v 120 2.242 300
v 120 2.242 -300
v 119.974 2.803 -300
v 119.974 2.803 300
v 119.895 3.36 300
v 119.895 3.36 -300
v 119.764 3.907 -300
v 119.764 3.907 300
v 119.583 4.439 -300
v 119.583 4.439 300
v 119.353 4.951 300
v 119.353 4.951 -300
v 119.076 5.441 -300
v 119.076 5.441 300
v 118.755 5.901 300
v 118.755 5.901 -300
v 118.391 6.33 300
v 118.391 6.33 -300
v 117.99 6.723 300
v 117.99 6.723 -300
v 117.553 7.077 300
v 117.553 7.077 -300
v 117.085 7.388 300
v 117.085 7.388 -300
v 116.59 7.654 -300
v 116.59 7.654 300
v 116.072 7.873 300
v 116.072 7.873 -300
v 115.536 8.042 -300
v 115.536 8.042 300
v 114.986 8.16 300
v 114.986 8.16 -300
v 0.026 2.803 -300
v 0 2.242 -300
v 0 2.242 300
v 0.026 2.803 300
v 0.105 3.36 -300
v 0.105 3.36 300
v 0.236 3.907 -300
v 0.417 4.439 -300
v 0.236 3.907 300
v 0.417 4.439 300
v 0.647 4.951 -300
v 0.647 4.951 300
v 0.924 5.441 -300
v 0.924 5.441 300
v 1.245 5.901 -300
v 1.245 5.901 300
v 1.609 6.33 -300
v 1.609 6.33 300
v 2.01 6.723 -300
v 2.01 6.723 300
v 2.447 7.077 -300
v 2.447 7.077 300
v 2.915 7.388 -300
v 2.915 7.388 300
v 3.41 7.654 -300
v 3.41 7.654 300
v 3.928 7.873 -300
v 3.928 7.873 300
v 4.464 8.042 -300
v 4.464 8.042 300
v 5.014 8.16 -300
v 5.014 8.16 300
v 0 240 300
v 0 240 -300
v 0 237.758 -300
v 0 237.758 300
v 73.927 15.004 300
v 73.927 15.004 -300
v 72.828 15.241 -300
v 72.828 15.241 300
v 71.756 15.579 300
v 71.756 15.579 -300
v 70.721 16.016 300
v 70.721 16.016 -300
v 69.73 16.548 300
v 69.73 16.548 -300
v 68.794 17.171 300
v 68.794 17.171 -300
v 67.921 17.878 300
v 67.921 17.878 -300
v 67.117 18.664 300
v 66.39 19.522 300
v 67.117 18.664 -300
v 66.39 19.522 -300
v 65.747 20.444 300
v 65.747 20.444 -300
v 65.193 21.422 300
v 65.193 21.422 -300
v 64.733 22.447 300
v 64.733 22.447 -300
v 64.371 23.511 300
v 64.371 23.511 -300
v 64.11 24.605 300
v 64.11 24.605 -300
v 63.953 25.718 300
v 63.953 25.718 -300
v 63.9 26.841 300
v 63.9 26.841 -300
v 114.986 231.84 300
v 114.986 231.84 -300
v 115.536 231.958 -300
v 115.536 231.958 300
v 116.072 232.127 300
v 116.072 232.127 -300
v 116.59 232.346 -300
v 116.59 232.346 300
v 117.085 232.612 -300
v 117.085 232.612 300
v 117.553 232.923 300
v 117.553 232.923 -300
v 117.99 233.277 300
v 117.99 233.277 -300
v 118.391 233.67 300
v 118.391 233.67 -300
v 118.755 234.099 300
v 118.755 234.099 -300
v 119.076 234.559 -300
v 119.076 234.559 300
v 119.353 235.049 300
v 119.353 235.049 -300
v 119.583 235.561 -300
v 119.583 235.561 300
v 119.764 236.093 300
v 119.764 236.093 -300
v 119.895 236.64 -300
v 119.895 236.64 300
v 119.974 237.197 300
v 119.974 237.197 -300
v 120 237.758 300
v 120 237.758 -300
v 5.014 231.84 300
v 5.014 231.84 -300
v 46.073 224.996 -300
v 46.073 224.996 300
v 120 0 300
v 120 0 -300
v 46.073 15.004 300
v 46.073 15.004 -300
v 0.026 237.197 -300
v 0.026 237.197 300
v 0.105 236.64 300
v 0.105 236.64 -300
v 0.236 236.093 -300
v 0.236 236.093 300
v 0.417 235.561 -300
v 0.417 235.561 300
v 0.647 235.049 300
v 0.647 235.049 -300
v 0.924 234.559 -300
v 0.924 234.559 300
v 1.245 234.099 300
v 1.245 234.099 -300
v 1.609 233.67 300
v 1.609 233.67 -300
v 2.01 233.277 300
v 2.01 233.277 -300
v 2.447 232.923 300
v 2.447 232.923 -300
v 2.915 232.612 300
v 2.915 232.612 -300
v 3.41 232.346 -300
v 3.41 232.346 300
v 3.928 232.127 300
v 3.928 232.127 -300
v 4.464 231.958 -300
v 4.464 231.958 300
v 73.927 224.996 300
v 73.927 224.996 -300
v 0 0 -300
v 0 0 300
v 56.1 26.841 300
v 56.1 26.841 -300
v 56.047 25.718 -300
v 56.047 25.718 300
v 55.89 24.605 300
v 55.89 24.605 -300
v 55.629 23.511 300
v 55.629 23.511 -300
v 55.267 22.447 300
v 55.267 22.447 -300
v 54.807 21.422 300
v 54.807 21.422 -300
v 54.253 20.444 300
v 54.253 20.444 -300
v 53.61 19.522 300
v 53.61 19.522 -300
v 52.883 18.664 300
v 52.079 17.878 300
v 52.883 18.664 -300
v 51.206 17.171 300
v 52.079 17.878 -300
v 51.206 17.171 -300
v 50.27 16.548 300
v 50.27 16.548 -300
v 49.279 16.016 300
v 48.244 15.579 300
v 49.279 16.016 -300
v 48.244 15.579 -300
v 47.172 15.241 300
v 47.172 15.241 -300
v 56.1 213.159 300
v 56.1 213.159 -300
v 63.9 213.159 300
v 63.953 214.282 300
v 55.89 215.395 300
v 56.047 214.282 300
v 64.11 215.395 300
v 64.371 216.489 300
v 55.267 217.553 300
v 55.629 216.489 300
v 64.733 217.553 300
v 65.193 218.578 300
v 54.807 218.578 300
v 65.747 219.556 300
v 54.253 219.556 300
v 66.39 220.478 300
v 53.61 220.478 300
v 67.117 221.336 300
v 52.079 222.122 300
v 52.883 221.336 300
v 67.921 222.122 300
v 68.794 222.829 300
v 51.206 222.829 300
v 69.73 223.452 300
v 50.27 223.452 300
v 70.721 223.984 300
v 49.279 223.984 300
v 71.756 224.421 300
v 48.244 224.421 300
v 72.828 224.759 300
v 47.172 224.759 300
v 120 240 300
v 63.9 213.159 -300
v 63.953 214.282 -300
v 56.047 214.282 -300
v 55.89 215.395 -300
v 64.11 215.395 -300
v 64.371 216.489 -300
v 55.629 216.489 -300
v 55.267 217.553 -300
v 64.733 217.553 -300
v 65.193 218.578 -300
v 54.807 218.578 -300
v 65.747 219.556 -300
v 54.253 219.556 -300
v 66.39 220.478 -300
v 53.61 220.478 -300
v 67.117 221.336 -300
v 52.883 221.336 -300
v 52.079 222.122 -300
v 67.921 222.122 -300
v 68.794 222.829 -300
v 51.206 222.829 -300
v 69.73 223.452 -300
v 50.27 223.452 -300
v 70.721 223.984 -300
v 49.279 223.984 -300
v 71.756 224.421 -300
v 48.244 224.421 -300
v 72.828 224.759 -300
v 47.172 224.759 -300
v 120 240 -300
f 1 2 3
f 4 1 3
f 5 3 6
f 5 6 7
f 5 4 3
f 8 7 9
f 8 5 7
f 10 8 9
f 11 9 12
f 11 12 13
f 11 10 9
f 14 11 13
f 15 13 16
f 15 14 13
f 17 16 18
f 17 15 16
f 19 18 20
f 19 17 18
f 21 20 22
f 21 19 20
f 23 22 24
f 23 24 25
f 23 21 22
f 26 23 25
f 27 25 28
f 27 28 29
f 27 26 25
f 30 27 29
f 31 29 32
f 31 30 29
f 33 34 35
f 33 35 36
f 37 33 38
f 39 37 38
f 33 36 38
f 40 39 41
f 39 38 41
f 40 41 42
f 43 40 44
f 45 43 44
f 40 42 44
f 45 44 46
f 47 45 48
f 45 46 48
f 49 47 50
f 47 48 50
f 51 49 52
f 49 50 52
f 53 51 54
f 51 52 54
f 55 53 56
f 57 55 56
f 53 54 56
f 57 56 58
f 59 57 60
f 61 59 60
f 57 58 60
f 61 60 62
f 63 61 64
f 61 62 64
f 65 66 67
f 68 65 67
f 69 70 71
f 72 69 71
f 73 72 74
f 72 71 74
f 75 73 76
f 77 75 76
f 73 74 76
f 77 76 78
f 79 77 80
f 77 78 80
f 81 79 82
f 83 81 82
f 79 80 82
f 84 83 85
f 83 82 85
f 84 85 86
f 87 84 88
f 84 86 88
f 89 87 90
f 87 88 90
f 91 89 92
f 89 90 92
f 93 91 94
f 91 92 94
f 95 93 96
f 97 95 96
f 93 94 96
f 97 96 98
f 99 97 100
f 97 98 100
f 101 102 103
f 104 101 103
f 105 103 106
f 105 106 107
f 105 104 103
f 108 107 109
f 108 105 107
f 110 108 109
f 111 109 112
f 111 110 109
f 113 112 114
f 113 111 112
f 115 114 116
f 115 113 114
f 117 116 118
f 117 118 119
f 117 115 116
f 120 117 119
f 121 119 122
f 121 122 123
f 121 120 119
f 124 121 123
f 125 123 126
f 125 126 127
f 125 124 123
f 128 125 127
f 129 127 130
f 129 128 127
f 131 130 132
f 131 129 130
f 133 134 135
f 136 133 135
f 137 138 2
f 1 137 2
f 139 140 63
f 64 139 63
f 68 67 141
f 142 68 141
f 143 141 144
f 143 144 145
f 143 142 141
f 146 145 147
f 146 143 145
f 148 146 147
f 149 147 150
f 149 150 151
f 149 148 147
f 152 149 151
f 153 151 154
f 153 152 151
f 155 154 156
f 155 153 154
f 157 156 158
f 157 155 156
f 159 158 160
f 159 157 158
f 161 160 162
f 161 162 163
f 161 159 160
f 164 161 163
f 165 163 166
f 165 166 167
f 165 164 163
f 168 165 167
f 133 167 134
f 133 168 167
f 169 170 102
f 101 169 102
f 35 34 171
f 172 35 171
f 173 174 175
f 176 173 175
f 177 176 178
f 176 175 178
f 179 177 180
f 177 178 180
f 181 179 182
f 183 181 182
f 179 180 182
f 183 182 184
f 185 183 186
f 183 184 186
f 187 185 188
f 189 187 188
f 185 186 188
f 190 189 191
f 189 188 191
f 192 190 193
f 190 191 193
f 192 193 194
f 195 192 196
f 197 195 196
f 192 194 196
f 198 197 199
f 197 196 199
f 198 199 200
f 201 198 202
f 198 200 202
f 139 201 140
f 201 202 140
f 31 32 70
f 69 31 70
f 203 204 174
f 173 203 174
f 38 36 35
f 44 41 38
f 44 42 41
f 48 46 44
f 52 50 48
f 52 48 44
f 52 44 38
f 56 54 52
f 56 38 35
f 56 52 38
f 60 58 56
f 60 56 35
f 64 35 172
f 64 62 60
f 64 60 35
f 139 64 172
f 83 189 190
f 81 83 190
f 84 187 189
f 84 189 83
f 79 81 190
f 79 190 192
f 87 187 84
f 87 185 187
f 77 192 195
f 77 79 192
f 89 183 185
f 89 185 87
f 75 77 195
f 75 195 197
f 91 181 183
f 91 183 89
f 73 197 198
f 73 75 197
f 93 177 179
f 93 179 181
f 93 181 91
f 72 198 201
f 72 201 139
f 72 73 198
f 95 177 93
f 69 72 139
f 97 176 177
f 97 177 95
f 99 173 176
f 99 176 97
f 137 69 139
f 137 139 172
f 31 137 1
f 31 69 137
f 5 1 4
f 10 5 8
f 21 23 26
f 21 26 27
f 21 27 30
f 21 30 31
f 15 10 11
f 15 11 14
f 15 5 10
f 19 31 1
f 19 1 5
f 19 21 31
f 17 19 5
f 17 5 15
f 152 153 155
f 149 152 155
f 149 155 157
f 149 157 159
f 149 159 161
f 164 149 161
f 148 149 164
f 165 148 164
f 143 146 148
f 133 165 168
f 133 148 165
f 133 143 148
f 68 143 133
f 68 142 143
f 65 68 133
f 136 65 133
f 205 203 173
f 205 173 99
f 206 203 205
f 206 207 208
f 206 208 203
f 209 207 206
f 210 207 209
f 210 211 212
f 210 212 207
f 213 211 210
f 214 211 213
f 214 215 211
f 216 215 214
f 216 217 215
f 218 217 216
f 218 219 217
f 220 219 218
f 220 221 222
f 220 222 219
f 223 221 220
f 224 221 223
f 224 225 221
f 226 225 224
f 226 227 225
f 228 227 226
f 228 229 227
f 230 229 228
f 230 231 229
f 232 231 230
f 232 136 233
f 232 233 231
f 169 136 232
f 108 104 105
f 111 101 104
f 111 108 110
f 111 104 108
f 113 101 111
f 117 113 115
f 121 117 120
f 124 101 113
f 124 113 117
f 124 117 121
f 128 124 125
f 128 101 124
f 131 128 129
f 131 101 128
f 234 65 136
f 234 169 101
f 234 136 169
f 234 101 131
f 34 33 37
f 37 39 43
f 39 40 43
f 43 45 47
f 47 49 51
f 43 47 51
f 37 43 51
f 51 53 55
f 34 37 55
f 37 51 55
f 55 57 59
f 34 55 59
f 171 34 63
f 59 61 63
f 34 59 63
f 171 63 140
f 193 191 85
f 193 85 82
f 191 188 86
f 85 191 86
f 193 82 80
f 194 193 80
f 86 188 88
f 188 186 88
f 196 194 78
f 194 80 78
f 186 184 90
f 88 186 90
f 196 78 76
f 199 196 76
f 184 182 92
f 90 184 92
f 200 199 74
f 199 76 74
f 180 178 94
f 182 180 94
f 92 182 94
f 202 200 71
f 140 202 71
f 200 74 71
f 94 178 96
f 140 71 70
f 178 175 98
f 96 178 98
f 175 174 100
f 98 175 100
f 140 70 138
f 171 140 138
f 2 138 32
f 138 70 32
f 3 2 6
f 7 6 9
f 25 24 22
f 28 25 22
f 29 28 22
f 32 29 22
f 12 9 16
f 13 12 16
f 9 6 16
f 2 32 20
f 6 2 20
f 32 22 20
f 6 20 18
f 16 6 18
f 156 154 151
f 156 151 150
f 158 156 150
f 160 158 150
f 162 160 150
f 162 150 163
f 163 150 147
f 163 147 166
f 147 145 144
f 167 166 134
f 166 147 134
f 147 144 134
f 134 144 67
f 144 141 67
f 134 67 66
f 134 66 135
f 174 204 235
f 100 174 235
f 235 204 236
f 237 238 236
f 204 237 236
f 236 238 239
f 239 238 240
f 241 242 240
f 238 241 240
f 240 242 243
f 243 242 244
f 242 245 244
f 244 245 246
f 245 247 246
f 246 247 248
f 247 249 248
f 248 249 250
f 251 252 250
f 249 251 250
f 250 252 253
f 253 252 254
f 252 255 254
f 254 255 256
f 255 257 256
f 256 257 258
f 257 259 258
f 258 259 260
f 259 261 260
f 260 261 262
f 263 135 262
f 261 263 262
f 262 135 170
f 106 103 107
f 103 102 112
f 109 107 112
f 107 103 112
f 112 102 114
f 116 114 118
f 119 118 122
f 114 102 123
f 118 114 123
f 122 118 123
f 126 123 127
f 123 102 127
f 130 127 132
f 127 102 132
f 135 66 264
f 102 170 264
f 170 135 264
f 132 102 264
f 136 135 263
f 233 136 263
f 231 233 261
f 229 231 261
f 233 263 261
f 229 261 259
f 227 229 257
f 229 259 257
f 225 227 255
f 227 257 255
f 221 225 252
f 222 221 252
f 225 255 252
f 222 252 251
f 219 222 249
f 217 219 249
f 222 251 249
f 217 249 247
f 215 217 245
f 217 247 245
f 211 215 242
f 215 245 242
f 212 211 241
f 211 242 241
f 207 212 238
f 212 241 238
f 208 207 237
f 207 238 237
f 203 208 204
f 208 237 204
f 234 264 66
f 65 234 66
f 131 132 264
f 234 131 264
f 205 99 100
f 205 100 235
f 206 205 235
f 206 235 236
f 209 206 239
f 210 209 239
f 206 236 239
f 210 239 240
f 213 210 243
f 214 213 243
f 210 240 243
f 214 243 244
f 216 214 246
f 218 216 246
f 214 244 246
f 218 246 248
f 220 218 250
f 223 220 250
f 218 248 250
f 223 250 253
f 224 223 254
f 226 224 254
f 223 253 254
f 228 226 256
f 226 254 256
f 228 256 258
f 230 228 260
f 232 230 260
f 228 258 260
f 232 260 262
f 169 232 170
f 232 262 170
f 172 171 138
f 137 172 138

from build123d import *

# Parameters (mm, degrees)
BASESBEAM_START = -300
BASESBEAM_DEPTH = 600
TOEFILLET_R     = 6


# Read off the part's stored shape, not the designer's step: BaseSbeam
with BuildPart() as part:
    # BaseSbeam outline → BaseSbeam (new body)
    with BuildSketch(Plane.XY.offset(BASESBEAM_START)):
        with BuildLine():
            Line((0, 7.324658955), (0, 0))
            Line((0, 0), (120, 0))
            Line((120, 0), (120, 7.324658955))
            Line((120, 7.324658955), (73.927072128, 15.004040437))
            ThreePointArc((73.927072128, 15.004040437), (66.743714332, 19.084299589), (63.9, 26.840744185))
            Line((63.9, 26.840744185), (63.9, 213.159255815))
            ThreePointArc((63.9, 213.159255815), (66.743714332, 220.915700411), (73.927072128, 224.995959563))
            Line((73.927072128, 224.995959563), (120, 232.675341045))
            Line((120, 232.675341045), (120, 240))
            Line((120, 240), (0, 240))
            Line((0, 240), (0, 232.675341045))
            Line((0, 232.675341045), (46.072927872, 224.995959563))
            ThreePointArc((46.072927872, 224.995959563), (53.256285668, 220.915700411), (56.1, 213.159255815))
            Line((56.1, 213.159255815), (56.1, 26.840744185))
            ThreePointArc((56.1, 26.840744185), (53.256285668, 19.084299589), (46.072927872, 15.004040437))
            Line((46.072927872, 15.004040437), (0, 7.324658955))
        make_face()
    extrude(amount=BASESBEAM_DEPTH)

    # ToeFillet
    toefillet_edges = [part.edges().sort_by_distance(p)[0] for p in [
        (120, 7.324658955, 0),
        (120, 232.675341045, 0),
        (0, 232.675341045, 0),
        (0, 7.324658955, 0),
    ]]
    fillet(toefillet_edges, radius=TOEFILLET_R)


solid = part.part
